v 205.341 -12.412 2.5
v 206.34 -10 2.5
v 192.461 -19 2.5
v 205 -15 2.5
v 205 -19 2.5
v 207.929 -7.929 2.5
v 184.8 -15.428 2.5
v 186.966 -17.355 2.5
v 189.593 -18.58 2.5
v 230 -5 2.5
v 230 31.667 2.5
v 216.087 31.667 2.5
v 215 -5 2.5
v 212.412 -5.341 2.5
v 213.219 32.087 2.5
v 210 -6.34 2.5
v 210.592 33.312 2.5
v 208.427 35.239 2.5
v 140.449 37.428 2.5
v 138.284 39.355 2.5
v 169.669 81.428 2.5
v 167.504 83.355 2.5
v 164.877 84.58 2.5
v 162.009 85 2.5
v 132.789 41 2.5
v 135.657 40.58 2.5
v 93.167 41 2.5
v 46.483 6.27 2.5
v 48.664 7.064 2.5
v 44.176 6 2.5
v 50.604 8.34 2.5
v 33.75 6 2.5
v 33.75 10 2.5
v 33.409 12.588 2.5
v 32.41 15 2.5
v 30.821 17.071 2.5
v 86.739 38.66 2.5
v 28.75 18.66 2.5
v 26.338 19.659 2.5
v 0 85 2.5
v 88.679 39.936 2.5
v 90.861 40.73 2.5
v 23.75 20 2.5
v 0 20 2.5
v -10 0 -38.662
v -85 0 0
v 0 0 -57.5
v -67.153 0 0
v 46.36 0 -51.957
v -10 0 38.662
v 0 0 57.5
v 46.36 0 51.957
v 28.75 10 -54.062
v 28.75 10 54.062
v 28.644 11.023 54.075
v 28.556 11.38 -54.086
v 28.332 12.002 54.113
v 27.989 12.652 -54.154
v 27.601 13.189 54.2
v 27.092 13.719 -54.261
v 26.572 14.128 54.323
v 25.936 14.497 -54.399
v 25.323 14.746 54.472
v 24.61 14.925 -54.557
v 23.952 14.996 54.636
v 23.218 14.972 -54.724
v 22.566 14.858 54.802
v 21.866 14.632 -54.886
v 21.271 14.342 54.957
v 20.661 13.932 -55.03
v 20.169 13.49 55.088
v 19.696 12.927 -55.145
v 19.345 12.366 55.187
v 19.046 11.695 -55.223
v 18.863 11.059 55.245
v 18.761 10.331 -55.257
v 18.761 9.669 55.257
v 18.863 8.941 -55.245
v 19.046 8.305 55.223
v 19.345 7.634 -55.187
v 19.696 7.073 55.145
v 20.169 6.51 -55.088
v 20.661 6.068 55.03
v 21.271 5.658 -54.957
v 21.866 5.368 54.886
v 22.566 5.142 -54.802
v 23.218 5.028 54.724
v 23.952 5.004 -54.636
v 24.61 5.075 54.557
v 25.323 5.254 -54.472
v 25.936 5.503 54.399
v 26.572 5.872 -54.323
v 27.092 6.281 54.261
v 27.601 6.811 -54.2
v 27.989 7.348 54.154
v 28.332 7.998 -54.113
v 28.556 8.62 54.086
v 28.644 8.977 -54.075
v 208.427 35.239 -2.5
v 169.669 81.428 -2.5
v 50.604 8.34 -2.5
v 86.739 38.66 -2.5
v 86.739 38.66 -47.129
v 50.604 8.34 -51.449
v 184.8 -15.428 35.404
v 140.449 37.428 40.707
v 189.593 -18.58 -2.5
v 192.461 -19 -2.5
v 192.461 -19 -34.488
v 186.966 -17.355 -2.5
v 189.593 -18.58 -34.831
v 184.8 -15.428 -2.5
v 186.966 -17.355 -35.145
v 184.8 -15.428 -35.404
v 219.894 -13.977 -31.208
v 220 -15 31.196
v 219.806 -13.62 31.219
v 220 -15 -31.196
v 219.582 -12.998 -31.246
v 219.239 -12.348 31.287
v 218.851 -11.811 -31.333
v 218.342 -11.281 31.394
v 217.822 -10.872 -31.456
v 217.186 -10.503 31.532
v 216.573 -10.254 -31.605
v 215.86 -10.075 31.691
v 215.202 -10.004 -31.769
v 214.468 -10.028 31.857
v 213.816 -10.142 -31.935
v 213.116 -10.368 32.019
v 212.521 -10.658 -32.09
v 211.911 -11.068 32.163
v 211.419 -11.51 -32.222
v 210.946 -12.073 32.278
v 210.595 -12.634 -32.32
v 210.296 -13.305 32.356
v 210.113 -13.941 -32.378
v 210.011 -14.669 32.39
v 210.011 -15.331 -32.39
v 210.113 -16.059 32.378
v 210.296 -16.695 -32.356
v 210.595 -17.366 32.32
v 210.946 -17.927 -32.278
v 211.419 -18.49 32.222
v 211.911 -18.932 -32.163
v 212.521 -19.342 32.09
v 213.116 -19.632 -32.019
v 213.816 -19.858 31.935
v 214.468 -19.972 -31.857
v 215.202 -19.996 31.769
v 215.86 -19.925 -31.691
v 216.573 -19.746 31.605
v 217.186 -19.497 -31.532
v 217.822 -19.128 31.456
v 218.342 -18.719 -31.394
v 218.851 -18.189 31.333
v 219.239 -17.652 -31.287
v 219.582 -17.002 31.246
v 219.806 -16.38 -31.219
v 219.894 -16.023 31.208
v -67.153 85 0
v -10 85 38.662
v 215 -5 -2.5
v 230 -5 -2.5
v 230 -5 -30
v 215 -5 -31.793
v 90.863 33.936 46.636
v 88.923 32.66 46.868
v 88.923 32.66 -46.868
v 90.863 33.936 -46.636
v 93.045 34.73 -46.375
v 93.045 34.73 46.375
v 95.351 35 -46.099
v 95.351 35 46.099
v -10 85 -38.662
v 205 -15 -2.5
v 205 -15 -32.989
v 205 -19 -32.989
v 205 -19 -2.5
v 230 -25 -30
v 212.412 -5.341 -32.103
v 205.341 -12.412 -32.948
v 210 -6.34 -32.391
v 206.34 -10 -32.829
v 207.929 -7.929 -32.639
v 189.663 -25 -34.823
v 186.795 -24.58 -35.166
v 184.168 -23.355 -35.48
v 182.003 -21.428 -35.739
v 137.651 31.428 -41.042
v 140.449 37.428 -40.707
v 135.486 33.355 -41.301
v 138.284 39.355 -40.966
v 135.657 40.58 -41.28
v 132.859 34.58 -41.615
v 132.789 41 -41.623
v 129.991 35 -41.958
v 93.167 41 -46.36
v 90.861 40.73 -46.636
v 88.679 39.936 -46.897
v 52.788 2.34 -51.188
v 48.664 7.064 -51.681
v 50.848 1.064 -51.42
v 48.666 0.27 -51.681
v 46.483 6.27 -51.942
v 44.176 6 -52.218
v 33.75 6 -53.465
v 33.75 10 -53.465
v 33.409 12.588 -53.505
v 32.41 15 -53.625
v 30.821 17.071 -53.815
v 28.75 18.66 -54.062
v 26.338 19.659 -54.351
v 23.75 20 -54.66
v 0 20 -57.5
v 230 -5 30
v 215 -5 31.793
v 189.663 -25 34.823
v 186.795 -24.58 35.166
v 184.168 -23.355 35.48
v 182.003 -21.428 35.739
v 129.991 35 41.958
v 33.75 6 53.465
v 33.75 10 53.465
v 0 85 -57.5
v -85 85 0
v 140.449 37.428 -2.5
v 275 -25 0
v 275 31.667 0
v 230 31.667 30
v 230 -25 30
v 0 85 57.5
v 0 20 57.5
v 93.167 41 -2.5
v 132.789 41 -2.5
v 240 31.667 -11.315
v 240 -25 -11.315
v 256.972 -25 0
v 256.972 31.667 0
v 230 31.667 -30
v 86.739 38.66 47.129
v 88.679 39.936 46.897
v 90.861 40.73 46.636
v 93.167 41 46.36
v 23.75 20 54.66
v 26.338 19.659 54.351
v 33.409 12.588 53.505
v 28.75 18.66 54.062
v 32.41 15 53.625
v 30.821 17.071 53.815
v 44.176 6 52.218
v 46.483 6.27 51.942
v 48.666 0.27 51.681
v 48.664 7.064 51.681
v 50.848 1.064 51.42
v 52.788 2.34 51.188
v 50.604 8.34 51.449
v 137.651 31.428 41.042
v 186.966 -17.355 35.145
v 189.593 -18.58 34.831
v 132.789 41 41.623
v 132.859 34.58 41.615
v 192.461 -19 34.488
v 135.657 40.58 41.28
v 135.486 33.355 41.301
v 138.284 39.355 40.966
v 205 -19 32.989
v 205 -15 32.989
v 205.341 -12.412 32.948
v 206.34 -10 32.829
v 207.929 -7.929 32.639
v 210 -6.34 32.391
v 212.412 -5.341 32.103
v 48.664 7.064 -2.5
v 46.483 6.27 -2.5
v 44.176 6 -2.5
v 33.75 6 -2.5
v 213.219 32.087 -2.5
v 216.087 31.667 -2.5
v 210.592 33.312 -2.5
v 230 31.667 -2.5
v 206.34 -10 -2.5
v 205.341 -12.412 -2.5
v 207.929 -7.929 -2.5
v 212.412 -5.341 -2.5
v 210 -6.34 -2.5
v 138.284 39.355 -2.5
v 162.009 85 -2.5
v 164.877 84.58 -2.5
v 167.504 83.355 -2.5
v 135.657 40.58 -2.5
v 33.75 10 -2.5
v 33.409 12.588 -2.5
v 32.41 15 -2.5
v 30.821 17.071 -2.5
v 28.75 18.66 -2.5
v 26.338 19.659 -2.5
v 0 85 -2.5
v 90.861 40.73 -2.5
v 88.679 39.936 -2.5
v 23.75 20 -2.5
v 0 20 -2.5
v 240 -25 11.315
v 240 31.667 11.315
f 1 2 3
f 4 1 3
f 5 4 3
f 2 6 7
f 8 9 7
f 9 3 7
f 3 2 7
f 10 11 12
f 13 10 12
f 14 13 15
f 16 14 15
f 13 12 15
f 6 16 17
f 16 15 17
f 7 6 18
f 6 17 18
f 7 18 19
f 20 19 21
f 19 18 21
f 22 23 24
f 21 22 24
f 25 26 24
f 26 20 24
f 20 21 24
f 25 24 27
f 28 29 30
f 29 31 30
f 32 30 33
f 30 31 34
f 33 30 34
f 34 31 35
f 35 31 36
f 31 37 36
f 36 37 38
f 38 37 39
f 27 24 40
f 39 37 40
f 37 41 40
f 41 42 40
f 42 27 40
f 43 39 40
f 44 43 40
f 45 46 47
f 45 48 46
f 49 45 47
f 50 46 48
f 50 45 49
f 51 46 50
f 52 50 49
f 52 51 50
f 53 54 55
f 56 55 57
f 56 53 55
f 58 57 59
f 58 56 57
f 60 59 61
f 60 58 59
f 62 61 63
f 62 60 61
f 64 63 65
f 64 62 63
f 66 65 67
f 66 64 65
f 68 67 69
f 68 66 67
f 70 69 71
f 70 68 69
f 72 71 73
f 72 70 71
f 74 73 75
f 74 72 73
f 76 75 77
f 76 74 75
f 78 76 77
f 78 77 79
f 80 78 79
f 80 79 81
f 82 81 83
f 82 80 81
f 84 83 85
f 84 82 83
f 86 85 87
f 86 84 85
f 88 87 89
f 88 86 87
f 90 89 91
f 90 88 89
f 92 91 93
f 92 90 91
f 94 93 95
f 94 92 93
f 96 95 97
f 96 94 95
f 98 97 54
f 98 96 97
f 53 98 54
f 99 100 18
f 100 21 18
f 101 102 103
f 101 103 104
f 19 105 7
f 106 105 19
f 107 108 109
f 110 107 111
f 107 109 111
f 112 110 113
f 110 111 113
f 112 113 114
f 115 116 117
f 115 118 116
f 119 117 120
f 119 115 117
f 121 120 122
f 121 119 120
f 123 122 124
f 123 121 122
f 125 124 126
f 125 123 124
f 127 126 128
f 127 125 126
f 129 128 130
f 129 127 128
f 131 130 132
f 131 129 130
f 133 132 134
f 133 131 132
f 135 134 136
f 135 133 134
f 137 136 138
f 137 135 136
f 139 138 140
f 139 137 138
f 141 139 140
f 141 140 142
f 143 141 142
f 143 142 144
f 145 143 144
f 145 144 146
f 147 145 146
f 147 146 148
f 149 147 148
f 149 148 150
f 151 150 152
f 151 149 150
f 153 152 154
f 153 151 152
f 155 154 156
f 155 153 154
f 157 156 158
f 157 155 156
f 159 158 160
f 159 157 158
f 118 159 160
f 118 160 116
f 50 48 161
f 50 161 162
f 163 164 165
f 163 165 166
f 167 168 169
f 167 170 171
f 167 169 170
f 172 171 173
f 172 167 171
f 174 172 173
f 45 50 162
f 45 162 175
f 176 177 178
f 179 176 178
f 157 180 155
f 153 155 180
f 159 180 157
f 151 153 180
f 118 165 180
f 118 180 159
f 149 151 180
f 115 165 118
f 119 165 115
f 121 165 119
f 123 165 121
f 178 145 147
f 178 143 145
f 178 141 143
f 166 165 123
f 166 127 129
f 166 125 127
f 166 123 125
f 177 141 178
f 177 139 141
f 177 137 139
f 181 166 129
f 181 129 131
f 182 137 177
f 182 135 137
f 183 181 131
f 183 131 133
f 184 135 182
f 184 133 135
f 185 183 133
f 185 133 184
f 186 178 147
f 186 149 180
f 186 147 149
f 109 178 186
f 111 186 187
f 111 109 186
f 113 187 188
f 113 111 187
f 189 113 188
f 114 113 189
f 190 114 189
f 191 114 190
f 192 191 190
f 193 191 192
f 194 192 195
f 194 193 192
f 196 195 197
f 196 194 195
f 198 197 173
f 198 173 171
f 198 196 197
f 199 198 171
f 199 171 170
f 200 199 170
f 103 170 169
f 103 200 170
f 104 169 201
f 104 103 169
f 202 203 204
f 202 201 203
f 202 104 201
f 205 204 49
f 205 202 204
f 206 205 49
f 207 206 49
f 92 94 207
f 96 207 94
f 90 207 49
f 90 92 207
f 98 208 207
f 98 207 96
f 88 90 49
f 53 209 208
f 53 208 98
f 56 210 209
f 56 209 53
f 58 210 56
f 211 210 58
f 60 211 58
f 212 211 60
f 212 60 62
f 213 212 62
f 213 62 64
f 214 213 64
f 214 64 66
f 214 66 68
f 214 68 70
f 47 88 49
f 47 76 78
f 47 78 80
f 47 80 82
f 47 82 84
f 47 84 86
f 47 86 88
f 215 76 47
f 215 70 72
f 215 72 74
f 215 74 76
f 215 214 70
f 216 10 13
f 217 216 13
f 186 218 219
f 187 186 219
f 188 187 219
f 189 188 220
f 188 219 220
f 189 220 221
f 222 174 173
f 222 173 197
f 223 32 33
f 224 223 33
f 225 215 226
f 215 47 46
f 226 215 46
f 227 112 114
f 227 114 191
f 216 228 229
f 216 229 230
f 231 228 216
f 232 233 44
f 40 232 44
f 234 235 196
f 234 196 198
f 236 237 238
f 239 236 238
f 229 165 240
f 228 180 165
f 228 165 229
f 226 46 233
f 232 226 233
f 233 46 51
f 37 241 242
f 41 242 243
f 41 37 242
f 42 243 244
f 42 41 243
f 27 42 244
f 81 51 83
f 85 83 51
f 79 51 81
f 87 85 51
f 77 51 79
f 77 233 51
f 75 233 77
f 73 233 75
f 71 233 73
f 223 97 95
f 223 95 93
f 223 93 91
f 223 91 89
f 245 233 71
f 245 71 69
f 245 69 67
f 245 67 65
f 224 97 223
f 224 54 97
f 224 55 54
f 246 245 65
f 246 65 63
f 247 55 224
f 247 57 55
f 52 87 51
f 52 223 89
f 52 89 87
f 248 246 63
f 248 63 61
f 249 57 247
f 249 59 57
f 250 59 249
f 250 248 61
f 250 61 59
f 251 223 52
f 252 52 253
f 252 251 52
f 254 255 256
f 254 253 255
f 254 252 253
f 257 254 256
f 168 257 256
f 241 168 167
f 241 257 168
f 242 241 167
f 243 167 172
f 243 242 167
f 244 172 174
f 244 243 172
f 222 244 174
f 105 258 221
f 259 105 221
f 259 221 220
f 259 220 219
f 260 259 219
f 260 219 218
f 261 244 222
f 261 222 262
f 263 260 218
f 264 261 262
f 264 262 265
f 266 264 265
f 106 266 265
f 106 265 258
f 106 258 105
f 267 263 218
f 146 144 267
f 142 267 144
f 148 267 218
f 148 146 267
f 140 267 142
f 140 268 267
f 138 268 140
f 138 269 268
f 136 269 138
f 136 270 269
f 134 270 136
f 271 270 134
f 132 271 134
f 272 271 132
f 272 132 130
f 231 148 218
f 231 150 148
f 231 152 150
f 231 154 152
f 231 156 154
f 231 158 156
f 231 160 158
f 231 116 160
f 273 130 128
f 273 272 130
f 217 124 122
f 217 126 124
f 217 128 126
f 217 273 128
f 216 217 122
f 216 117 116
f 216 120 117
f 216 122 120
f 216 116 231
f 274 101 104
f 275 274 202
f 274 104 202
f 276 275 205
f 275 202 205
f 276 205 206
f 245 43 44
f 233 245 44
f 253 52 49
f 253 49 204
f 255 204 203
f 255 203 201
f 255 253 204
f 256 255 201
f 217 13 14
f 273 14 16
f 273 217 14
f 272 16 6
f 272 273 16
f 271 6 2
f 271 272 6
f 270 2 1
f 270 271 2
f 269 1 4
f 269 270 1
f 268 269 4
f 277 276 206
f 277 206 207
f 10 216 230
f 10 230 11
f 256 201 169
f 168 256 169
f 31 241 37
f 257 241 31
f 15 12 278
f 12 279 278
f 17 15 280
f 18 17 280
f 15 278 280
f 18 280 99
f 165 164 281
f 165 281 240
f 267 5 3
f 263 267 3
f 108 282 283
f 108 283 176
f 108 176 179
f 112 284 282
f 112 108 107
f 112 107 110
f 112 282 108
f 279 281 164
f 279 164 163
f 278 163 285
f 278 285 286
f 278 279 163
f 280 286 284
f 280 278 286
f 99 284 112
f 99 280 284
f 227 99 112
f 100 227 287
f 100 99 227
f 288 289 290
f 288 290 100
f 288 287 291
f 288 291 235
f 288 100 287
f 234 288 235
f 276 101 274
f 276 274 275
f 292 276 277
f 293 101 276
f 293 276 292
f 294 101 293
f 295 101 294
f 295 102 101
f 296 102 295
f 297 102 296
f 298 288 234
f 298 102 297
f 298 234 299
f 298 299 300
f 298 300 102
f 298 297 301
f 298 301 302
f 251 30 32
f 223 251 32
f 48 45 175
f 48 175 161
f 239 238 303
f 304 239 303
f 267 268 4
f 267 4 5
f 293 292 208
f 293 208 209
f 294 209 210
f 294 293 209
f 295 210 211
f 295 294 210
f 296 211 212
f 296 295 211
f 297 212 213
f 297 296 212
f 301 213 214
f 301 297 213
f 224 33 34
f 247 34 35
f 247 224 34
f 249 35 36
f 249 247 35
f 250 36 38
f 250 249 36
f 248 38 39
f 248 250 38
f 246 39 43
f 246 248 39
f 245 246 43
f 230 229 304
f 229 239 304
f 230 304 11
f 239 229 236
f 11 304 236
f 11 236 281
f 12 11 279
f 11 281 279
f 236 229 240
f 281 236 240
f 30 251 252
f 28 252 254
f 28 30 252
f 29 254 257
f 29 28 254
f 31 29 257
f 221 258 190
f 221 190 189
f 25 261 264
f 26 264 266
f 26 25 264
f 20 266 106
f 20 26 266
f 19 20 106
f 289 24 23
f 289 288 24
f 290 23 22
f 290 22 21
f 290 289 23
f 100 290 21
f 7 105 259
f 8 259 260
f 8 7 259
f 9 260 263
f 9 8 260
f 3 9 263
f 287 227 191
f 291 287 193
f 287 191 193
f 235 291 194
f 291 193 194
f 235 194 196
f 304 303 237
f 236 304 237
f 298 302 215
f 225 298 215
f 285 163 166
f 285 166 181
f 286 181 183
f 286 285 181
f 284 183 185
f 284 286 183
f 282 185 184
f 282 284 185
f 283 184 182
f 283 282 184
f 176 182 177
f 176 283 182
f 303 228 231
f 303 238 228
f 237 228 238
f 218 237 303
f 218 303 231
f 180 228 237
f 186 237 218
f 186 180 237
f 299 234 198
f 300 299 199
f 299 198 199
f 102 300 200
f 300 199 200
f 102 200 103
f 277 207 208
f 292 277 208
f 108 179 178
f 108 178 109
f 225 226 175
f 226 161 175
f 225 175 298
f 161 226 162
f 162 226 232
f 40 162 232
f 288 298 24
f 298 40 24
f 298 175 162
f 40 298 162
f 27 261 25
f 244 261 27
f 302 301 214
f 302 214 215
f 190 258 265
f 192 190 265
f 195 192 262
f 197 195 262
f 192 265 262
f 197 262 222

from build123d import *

# Parameters (mm, degrees)
BOSS_EXTRUDE1_DEPTH     = 85
SKETCH3_R               = 5
BOSS_EXTRUDE2_DEPTH     = 57.5
BOSS_EXTRUDE3_START     = -25
BOSS_EXTRUDE3_DEPTH     = 56.666666667
BOSS_EXTRUDE4_DEPTH     = 2.5
FILLET2_R               = 10
CUT_EXTRUDE1_DEPTH      = 86
CUT_EXTRUDE1_DEPTH_BACK = 26


with BuildPart() as part:
    # Sketch2 → Boss-Extrude1 (new body)
    with BuildSketch(Plane(origin=(0, 0, 0), x_dir=(1, 0, 0), z_dir=(0, 1, 0))):
        Polygon((0, -57.5), (0, 57.5), (-85, 0), align=None)
        Polygon((-10, 38.662131911), (-67.152716738, 0), (-10, -38.662131911), align=None, mode=Mode.SUBTRACT)
    extrude(amount=BOSS_EXTRUDE1_DEPTH)

    # Sketch3 → Boss-Extrude2 (add, symmetric)
    with BuildSketch(Plane.XY):
        with BuildLine():
            Line((0, 0), (50, 0))
            Line((50, 0), (91.711375741, 35))
            Line((91.711375741, 35), (134.654022129, 35))
            Line((134.654022129, 35), (185, -25))
            Line((185, -25), (230, -25))
            Line((230, -25), (230, -19))
            Line((230, -19), (230, -5))
            Line((230, -5), (215, -5))
            ThreePointArc((215, -5), (207.928932188, -7.928932188), (205, -15))
            Line((205, -15), (205, -19))
            Line((205, -19), (187.797845949, -19))
            Line((187.797845949, -19), (137.451868078, 41))
            Line((137.451868078, 41), (89.527554335, 41))
            Line((89.527554335, 41), (47.816178594, 6))
            Line((47.816178594, 6), (33.75, 6))
            Line((33.75, 6), (33.75, 10))
            ThreePointArc((33.75, 10), (30.821067812, 17.071067812), (23.75, 20))
            Line((23.75, 20), (0, 20))
            Line((0, 20), (0, 0))
        make_face()
        with Locations((23.75, 10)):
            Circle(SKETCH3_R, mode=Mode.SUBTRACT)
        with Locations((215, -15)):
            Circle(SKETCH3_R, mode=Mode.SUBTRACT)
    extrude(amount=BOSS_EXTRUDE2_DEPTH, both=True)

    # Sketch4 → Boss-Extrude3 (add)
    with BuildSketch(Plane(origin=(0, 0, 0), x_dir=(1, 0, 0), z_dir=(0, 1, 0)).offset(BOSS_EXTRUDE3_START)):
        Polygon((230, -30), (230, 30), (275, 0), align=None)
        Polygon((240, 11.314829082), (256.972243623, 0), (240, -11.314829082), align=None, mode=Mode.SUBTRACT)
    extrude(amount=BOSS_EXTRUDE3_DEPTH)

    # Sketch5 → Boss-Extrude4 (add, symmetric)
    with BuildSketch(Plane.XY):
        with BuildLine():
            Line((0, 85), (166.672120299, 85))
            Line((166.672120299, 85), (211.424100629, 31.666666667))
            Line((211.424100629, 31.666666667), (230, 31.666666667))
            Line((230, 31.666666667), (230, -5))
            Line((230, -5), (215, -5))
            ThreePointArc((215, -5), (207.928932188, -7.928932188), (205, -15))
            Line((205, -15), (205, -19))
            Line((205, -19), (187.797845949, -19))
            Line((187.797845949, -19), (137.451868078, 41))
            Line((137.451868078, 41), (89.527554335, 41))
            Line((89.527554335, 41), (47.816178594, 6))
            Line((47.816178594, 6), (33.75, 6))
            Line((33.75, 6), (33.75, 10))
            ThreePointArc((33.75, 10), (30.821067812, 17.071067812), (23.75, 20))
            Line((23.75, 20), (0, 20))
            Line((0, 20), (0, 85))
        make_face()
    extrude(amount=BOSS_EXTRUDE4_DEPTH, both=True)

    # Fillet2
    fillet2_edges = [part.edges().sort_by_distance(p)[0] for p in [
        (211.424100629, 31.666666667, 0),
        (166.672120299, 85, 0),
        (50, 0, 0),
        (91.711375741, 35, 0),
        (134.654022129, 35, 0),
        (185, -25, 0),
        (187.797845949, -19, 30),
        (137.451868078, 41, 30),
        (89.527554335, 41, 30),
        (47.816178594, 6, 30),
        (47.816178594, 6, -30),
        (89.527554335, 41, -30),
        (137.451868078, 41, -30),
        (187.797845949, -19, -30),
    ]]
    fillet(fillet2_edges, radius=FILLET2_R)

    # Sketch6 → Cut-Extrude1 (cut, two sides)
    with BuildSketch(Plane(origin=(0, 0, 0), x_dir=(1, 0, 0), z_dir=(0, 1, 0))) as cut_extrude1_sk:
        Polygon((0, 57.5), (230, 57.5), (230, 30), align=None)
        Polygon((0, -57.5), (230, -30), (230, -57.5), align=None)
    extrude(amount=CUT_EXTRUDE1_DEPTH, mode=Mode.SUBTRACT)
    extrude(cut_extrude1_sk.sketch, amount=-CUT_EXTRUDE1_DEPTH_BACK, mode=Mode.SUBTRACT)


solid = part.part
